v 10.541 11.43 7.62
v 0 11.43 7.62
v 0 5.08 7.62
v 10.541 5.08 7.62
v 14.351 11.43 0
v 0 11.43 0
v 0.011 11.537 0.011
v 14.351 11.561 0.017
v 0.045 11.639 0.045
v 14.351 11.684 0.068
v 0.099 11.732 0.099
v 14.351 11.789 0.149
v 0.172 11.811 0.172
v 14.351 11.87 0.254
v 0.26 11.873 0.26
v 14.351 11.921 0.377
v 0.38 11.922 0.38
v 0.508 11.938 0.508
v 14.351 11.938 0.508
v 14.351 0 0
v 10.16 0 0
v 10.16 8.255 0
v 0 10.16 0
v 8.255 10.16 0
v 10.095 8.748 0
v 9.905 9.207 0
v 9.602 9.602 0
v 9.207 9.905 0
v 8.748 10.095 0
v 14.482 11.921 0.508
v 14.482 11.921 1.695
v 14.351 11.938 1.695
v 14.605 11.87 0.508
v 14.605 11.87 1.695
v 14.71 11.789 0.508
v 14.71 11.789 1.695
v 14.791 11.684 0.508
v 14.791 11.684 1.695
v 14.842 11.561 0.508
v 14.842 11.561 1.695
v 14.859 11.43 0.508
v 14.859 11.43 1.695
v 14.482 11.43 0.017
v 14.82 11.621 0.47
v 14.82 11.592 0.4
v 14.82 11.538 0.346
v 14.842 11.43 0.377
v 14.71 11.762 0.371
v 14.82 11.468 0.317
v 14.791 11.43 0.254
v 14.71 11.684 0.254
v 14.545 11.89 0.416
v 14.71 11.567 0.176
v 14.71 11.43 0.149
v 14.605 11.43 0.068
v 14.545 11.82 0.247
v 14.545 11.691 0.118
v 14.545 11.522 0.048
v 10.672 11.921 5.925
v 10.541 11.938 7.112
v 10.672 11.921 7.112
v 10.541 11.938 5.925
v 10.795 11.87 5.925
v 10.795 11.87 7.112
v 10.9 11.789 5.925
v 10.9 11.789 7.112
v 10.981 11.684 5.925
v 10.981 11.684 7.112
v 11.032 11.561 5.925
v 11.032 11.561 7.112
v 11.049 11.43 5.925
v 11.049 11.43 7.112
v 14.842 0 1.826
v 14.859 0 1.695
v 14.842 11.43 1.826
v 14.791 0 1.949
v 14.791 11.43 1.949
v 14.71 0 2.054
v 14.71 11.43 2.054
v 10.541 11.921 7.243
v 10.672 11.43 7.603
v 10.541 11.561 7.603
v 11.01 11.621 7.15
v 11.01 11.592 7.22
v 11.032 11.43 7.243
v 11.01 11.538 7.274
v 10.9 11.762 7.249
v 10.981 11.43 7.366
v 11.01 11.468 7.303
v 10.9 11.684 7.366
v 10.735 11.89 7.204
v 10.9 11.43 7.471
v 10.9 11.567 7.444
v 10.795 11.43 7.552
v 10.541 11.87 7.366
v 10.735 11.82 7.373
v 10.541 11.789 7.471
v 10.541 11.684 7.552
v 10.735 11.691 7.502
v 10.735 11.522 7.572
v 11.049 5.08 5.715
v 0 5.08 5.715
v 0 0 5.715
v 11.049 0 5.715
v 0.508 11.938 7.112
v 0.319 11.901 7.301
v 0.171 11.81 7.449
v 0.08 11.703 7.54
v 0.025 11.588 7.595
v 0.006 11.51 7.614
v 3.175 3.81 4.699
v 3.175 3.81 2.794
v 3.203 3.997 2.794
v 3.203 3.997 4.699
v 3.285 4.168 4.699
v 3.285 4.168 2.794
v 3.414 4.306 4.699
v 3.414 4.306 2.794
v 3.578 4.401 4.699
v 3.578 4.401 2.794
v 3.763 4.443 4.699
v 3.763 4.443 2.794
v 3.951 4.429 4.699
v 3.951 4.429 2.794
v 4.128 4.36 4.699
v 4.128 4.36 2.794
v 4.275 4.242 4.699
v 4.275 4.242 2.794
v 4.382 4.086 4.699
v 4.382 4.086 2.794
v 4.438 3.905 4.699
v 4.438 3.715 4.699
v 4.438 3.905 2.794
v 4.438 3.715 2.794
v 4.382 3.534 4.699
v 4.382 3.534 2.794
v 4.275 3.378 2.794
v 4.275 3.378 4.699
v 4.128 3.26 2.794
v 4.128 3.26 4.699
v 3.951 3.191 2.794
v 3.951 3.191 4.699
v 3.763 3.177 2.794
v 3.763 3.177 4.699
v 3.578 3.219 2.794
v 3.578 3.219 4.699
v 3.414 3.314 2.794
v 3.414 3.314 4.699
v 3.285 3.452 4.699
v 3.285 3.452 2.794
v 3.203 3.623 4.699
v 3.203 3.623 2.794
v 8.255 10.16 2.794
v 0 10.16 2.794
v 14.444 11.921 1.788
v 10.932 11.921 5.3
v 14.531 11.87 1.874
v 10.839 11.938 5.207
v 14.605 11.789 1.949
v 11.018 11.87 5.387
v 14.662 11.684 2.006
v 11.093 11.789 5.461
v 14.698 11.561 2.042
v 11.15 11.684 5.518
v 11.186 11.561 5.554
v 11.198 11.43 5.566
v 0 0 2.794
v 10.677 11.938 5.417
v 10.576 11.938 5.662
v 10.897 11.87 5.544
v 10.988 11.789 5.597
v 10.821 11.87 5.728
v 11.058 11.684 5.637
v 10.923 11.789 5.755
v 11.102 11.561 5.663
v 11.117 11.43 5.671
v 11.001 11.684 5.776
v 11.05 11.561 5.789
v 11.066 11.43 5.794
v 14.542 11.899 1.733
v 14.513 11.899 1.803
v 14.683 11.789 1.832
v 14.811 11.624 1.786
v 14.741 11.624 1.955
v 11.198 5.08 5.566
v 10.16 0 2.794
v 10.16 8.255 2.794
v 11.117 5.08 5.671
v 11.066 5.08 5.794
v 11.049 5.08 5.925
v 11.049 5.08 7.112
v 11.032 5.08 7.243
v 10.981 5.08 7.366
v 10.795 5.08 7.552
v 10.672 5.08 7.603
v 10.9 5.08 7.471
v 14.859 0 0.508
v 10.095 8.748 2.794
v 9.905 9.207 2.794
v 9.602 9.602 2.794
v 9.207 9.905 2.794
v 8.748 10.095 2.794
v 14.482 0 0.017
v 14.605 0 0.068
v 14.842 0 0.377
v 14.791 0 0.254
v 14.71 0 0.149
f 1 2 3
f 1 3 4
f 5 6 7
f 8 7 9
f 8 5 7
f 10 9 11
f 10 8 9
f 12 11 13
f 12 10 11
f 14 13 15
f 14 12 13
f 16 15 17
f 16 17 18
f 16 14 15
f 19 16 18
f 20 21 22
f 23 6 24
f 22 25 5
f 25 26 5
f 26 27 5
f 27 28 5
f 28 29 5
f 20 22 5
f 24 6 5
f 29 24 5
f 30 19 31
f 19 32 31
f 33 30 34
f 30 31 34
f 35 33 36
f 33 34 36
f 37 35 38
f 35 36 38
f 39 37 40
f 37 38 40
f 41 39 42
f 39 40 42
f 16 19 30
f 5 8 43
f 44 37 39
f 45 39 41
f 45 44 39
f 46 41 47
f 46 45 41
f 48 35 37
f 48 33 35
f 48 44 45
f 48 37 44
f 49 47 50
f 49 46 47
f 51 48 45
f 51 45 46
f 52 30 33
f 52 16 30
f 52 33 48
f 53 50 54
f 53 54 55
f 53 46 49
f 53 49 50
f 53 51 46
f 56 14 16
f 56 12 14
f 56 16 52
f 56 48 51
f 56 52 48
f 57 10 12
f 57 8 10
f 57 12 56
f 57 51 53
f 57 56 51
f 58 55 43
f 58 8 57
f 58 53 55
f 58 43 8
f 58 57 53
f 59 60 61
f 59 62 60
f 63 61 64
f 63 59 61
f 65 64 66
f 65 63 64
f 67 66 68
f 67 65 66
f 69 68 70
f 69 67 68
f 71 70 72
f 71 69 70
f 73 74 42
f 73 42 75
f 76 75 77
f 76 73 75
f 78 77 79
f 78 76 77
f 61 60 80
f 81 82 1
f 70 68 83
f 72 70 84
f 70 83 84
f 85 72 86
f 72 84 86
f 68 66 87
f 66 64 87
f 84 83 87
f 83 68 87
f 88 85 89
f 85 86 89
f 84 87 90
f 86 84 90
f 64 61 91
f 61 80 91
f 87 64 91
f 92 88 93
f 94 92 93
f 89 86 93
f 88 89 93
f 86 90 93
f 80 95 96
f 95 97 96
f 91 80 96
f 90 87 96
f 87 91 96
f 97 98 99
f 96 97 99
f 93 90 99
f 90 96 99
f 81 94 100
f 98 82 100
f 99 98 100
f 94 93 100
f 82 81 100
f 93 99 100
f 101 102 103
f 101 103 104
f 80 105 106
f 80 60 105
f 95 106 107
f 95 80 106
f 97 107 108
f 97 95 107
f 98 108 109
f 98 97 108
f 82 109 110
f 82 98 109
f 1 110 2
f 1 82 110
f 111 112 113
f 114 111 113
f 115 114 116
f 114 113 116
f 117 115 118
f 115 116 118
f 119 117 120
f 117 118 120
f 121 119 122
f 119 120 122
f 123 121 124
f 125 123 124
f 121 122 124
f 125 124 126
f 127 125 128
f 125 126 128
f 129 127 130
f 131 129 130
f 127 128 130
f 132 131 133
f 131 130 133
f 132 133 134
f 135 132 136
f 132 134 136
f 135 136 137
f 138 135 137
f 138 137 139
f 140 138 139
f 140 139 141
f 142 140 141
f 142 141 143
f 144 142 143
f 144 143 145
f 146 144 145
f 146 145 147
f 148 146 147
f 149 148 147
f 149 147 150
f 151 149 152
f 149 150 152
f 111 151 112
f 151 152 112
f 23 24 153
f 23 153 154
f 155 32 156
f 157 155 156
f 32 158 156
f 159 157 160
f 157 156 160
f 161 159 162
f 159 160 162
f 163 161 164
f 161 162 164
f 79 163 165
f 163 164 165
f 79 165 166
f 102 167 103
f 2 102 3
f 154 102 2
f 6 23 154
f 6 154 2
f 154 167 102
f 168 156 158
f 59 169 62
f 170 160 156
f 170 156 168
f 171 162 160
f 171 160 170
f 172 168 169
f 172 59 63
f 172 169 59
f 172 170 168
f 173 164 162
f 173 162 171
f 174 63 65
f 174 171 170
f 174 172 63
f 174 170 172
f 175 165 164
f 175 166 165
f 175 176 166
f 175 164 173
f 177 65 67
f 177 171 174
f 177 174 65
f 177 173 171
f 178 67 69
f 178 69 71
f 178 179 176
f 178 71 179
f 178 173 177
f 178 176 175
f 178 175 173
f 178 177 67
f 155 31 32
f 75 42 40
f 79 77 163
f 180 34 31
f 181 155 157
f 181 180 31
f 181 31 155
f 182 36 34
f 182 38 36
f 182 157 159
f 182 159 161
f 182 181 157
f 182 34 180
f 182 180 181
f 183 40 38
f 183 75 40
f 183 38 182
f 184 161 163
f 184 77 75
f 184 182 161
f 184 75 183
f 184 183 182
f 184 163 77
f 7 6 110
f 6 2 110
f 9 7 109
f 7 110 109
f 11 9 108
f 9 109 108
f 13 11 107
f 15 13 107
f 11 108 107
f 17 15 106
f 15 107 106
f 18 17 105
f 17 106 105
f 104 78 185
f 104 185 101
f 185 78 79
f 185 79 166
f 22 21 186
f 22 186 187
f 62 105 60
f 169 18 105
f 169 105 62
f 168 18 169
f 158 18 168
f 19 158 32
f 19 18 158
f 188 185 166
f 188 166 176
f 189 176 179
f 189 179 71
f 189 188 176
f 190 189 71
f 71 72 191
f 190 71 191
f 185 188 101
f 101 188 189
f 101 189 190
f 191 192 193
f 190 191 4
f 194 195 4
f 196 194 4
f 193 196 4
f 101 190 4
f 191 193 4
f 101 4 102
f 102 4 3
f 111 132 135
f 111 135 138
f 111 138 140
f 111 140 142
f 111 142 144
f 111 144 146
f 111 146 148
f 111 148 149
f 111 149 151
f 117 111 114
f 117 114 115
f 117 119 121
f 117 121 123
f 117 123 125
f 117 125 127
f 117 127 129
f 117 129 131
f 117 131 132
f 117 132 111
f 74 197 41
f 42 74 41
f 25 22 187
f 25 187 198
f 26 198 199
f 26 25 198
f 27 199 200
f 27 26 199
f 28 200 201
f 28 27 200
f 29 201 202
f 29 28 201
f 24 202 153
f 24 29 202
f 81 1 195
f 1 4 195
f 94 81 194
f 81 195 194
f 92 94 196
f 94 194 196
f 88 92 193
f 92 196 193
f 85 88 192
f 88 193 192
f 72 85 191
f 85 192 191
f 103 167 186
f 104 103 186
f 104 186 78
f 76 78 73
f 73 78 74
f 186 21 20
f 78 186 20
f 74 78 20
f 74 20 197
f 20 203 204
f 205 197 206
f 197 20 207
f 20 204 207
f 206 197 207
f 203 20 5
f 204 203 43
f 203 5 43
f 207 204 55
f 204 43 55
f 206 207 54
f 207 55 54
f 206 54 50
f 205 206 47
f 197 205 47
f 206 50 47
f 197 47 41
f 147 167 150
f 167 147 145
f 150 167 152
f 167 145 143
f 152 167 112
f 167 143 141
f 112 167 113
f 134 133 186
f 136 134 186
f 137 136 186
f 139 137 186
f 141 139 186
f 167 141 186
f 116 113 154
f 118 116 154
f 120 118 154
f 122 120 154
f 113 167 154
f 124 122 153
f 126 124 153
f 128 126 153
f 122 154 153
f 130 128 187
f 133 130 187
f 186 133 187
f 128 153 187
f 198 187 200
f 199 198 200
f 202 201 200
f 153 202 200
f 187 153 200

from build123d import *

# Parameters (mm, degrees)
SKETCH2_W           = 14.859
SKETCH2_H           = 11.938
BOSS_EXTRUDE1_DEPTH = 7.62
CUT_EXTRUDE2_DEPTH  = 2.794
CUT_EXTRUDE3_DEPTH  = 1.905
CUT_EXTRUDE4_DEPTH  = 12.938
FILLET1_R           = 0.508
SKETCH7_R           = 0.635
CUT_EXTRUDE13_DEPTH = 1.905


with BuildPart() as part:
    # Sketch2 → Boss-Extrude1 (new body)
    with BuildSketch(Plane.XY):
        with Locations((7.4295, 5.969)):
            Rectangle(SKETCH2_W, SKETCH2_H)
    extrude(amount=BOSS_EXTRUDE1_DEPTH)

    # Sketch4 → Cut-Extrude2 (cut)
    with BuildSketch(Plane(origin=(0, 0, 0), x_dir=(-1, 0, 0), z_dir=(0, 0, -1))):
        with BuildLine():
            Line((0, 0), (-10.16, 0))
            Line((-10.16, 0), (-10.16, 8.255))
            ThreePointArc((-10.16, 8.255), (-9.602038418, 9.602038418), (-8.255, 10.16))
            Line((-8.255, 10.16), (0, 10.16))
            Line((0, 10.16), (0, 0))
        make_face()
    extrude(amount=-CUT_EXTRUDE2_DEPTH, mode=Mode.SUBTRACT)

    # Sketch5 → Cut-Extrude3 (cut)
    with BuildSketch(Plane.XY.offset(7.62)):
        Polygon((14.859, 11.938), (11.049, 11.938), (11.049, 5.08), (0, 5.08), (0, 0), (14.859, 0), align=None)
    extrude(amount=-CUT_EXTRUDE3_DEPTH, mode=Mode.SUBTRACT)

    # Sketch6 → Cut-Extrude4 (cut, through all)
    with BuildSketch(Plane(origin=(0, 11.938, 0), x_dir=(1, 0, 0), z_dir=(0, 1, 0))):
        Polygon((14.859, -1.905), (11.049, -5.715), (14.859, -5.715), align=None)
    extrude(amount=-CUT_EXTRUDE4_DEPTH, mode=Mode.SUBTRACT)

    # Fillet1
    fillet1_edges = [part.edges().sort_by_distance(p)[0] for p in [
        (5.5245, 11.938, 7.62),
        (11.049, 11.938, 6.6675),
        (11.049, 8.509, 5.715),
        (11.049, 8.509, 7.62),
        (7.4295, 11.938, 0),
        (14.859, 11.938, 0.9525),
        (14.859, 5.969, 0),
        (12.954, 11.938, 3.81),
        (14.859, 5.969, 1.905),
        (0, 11.938, 3.81),
    ]]
    fillet(fillet1_edges, radius=FILLET1_R)

    # Sketch7 → Cut-Extrude13 (cut)
    with BuildSketch(Plane(origin=(0, 0, 2.794), x_dir=(-1, 0, 0), z_dir=(0, 0, -1))):
        with Locations((-3.81, 3.81)):
            Circle(SKETCH7_R)
    extrude(amount=-CUT_EXTRUDE13_DEPTH, mode=Mode.SUBTRACT)


solid = part.part
